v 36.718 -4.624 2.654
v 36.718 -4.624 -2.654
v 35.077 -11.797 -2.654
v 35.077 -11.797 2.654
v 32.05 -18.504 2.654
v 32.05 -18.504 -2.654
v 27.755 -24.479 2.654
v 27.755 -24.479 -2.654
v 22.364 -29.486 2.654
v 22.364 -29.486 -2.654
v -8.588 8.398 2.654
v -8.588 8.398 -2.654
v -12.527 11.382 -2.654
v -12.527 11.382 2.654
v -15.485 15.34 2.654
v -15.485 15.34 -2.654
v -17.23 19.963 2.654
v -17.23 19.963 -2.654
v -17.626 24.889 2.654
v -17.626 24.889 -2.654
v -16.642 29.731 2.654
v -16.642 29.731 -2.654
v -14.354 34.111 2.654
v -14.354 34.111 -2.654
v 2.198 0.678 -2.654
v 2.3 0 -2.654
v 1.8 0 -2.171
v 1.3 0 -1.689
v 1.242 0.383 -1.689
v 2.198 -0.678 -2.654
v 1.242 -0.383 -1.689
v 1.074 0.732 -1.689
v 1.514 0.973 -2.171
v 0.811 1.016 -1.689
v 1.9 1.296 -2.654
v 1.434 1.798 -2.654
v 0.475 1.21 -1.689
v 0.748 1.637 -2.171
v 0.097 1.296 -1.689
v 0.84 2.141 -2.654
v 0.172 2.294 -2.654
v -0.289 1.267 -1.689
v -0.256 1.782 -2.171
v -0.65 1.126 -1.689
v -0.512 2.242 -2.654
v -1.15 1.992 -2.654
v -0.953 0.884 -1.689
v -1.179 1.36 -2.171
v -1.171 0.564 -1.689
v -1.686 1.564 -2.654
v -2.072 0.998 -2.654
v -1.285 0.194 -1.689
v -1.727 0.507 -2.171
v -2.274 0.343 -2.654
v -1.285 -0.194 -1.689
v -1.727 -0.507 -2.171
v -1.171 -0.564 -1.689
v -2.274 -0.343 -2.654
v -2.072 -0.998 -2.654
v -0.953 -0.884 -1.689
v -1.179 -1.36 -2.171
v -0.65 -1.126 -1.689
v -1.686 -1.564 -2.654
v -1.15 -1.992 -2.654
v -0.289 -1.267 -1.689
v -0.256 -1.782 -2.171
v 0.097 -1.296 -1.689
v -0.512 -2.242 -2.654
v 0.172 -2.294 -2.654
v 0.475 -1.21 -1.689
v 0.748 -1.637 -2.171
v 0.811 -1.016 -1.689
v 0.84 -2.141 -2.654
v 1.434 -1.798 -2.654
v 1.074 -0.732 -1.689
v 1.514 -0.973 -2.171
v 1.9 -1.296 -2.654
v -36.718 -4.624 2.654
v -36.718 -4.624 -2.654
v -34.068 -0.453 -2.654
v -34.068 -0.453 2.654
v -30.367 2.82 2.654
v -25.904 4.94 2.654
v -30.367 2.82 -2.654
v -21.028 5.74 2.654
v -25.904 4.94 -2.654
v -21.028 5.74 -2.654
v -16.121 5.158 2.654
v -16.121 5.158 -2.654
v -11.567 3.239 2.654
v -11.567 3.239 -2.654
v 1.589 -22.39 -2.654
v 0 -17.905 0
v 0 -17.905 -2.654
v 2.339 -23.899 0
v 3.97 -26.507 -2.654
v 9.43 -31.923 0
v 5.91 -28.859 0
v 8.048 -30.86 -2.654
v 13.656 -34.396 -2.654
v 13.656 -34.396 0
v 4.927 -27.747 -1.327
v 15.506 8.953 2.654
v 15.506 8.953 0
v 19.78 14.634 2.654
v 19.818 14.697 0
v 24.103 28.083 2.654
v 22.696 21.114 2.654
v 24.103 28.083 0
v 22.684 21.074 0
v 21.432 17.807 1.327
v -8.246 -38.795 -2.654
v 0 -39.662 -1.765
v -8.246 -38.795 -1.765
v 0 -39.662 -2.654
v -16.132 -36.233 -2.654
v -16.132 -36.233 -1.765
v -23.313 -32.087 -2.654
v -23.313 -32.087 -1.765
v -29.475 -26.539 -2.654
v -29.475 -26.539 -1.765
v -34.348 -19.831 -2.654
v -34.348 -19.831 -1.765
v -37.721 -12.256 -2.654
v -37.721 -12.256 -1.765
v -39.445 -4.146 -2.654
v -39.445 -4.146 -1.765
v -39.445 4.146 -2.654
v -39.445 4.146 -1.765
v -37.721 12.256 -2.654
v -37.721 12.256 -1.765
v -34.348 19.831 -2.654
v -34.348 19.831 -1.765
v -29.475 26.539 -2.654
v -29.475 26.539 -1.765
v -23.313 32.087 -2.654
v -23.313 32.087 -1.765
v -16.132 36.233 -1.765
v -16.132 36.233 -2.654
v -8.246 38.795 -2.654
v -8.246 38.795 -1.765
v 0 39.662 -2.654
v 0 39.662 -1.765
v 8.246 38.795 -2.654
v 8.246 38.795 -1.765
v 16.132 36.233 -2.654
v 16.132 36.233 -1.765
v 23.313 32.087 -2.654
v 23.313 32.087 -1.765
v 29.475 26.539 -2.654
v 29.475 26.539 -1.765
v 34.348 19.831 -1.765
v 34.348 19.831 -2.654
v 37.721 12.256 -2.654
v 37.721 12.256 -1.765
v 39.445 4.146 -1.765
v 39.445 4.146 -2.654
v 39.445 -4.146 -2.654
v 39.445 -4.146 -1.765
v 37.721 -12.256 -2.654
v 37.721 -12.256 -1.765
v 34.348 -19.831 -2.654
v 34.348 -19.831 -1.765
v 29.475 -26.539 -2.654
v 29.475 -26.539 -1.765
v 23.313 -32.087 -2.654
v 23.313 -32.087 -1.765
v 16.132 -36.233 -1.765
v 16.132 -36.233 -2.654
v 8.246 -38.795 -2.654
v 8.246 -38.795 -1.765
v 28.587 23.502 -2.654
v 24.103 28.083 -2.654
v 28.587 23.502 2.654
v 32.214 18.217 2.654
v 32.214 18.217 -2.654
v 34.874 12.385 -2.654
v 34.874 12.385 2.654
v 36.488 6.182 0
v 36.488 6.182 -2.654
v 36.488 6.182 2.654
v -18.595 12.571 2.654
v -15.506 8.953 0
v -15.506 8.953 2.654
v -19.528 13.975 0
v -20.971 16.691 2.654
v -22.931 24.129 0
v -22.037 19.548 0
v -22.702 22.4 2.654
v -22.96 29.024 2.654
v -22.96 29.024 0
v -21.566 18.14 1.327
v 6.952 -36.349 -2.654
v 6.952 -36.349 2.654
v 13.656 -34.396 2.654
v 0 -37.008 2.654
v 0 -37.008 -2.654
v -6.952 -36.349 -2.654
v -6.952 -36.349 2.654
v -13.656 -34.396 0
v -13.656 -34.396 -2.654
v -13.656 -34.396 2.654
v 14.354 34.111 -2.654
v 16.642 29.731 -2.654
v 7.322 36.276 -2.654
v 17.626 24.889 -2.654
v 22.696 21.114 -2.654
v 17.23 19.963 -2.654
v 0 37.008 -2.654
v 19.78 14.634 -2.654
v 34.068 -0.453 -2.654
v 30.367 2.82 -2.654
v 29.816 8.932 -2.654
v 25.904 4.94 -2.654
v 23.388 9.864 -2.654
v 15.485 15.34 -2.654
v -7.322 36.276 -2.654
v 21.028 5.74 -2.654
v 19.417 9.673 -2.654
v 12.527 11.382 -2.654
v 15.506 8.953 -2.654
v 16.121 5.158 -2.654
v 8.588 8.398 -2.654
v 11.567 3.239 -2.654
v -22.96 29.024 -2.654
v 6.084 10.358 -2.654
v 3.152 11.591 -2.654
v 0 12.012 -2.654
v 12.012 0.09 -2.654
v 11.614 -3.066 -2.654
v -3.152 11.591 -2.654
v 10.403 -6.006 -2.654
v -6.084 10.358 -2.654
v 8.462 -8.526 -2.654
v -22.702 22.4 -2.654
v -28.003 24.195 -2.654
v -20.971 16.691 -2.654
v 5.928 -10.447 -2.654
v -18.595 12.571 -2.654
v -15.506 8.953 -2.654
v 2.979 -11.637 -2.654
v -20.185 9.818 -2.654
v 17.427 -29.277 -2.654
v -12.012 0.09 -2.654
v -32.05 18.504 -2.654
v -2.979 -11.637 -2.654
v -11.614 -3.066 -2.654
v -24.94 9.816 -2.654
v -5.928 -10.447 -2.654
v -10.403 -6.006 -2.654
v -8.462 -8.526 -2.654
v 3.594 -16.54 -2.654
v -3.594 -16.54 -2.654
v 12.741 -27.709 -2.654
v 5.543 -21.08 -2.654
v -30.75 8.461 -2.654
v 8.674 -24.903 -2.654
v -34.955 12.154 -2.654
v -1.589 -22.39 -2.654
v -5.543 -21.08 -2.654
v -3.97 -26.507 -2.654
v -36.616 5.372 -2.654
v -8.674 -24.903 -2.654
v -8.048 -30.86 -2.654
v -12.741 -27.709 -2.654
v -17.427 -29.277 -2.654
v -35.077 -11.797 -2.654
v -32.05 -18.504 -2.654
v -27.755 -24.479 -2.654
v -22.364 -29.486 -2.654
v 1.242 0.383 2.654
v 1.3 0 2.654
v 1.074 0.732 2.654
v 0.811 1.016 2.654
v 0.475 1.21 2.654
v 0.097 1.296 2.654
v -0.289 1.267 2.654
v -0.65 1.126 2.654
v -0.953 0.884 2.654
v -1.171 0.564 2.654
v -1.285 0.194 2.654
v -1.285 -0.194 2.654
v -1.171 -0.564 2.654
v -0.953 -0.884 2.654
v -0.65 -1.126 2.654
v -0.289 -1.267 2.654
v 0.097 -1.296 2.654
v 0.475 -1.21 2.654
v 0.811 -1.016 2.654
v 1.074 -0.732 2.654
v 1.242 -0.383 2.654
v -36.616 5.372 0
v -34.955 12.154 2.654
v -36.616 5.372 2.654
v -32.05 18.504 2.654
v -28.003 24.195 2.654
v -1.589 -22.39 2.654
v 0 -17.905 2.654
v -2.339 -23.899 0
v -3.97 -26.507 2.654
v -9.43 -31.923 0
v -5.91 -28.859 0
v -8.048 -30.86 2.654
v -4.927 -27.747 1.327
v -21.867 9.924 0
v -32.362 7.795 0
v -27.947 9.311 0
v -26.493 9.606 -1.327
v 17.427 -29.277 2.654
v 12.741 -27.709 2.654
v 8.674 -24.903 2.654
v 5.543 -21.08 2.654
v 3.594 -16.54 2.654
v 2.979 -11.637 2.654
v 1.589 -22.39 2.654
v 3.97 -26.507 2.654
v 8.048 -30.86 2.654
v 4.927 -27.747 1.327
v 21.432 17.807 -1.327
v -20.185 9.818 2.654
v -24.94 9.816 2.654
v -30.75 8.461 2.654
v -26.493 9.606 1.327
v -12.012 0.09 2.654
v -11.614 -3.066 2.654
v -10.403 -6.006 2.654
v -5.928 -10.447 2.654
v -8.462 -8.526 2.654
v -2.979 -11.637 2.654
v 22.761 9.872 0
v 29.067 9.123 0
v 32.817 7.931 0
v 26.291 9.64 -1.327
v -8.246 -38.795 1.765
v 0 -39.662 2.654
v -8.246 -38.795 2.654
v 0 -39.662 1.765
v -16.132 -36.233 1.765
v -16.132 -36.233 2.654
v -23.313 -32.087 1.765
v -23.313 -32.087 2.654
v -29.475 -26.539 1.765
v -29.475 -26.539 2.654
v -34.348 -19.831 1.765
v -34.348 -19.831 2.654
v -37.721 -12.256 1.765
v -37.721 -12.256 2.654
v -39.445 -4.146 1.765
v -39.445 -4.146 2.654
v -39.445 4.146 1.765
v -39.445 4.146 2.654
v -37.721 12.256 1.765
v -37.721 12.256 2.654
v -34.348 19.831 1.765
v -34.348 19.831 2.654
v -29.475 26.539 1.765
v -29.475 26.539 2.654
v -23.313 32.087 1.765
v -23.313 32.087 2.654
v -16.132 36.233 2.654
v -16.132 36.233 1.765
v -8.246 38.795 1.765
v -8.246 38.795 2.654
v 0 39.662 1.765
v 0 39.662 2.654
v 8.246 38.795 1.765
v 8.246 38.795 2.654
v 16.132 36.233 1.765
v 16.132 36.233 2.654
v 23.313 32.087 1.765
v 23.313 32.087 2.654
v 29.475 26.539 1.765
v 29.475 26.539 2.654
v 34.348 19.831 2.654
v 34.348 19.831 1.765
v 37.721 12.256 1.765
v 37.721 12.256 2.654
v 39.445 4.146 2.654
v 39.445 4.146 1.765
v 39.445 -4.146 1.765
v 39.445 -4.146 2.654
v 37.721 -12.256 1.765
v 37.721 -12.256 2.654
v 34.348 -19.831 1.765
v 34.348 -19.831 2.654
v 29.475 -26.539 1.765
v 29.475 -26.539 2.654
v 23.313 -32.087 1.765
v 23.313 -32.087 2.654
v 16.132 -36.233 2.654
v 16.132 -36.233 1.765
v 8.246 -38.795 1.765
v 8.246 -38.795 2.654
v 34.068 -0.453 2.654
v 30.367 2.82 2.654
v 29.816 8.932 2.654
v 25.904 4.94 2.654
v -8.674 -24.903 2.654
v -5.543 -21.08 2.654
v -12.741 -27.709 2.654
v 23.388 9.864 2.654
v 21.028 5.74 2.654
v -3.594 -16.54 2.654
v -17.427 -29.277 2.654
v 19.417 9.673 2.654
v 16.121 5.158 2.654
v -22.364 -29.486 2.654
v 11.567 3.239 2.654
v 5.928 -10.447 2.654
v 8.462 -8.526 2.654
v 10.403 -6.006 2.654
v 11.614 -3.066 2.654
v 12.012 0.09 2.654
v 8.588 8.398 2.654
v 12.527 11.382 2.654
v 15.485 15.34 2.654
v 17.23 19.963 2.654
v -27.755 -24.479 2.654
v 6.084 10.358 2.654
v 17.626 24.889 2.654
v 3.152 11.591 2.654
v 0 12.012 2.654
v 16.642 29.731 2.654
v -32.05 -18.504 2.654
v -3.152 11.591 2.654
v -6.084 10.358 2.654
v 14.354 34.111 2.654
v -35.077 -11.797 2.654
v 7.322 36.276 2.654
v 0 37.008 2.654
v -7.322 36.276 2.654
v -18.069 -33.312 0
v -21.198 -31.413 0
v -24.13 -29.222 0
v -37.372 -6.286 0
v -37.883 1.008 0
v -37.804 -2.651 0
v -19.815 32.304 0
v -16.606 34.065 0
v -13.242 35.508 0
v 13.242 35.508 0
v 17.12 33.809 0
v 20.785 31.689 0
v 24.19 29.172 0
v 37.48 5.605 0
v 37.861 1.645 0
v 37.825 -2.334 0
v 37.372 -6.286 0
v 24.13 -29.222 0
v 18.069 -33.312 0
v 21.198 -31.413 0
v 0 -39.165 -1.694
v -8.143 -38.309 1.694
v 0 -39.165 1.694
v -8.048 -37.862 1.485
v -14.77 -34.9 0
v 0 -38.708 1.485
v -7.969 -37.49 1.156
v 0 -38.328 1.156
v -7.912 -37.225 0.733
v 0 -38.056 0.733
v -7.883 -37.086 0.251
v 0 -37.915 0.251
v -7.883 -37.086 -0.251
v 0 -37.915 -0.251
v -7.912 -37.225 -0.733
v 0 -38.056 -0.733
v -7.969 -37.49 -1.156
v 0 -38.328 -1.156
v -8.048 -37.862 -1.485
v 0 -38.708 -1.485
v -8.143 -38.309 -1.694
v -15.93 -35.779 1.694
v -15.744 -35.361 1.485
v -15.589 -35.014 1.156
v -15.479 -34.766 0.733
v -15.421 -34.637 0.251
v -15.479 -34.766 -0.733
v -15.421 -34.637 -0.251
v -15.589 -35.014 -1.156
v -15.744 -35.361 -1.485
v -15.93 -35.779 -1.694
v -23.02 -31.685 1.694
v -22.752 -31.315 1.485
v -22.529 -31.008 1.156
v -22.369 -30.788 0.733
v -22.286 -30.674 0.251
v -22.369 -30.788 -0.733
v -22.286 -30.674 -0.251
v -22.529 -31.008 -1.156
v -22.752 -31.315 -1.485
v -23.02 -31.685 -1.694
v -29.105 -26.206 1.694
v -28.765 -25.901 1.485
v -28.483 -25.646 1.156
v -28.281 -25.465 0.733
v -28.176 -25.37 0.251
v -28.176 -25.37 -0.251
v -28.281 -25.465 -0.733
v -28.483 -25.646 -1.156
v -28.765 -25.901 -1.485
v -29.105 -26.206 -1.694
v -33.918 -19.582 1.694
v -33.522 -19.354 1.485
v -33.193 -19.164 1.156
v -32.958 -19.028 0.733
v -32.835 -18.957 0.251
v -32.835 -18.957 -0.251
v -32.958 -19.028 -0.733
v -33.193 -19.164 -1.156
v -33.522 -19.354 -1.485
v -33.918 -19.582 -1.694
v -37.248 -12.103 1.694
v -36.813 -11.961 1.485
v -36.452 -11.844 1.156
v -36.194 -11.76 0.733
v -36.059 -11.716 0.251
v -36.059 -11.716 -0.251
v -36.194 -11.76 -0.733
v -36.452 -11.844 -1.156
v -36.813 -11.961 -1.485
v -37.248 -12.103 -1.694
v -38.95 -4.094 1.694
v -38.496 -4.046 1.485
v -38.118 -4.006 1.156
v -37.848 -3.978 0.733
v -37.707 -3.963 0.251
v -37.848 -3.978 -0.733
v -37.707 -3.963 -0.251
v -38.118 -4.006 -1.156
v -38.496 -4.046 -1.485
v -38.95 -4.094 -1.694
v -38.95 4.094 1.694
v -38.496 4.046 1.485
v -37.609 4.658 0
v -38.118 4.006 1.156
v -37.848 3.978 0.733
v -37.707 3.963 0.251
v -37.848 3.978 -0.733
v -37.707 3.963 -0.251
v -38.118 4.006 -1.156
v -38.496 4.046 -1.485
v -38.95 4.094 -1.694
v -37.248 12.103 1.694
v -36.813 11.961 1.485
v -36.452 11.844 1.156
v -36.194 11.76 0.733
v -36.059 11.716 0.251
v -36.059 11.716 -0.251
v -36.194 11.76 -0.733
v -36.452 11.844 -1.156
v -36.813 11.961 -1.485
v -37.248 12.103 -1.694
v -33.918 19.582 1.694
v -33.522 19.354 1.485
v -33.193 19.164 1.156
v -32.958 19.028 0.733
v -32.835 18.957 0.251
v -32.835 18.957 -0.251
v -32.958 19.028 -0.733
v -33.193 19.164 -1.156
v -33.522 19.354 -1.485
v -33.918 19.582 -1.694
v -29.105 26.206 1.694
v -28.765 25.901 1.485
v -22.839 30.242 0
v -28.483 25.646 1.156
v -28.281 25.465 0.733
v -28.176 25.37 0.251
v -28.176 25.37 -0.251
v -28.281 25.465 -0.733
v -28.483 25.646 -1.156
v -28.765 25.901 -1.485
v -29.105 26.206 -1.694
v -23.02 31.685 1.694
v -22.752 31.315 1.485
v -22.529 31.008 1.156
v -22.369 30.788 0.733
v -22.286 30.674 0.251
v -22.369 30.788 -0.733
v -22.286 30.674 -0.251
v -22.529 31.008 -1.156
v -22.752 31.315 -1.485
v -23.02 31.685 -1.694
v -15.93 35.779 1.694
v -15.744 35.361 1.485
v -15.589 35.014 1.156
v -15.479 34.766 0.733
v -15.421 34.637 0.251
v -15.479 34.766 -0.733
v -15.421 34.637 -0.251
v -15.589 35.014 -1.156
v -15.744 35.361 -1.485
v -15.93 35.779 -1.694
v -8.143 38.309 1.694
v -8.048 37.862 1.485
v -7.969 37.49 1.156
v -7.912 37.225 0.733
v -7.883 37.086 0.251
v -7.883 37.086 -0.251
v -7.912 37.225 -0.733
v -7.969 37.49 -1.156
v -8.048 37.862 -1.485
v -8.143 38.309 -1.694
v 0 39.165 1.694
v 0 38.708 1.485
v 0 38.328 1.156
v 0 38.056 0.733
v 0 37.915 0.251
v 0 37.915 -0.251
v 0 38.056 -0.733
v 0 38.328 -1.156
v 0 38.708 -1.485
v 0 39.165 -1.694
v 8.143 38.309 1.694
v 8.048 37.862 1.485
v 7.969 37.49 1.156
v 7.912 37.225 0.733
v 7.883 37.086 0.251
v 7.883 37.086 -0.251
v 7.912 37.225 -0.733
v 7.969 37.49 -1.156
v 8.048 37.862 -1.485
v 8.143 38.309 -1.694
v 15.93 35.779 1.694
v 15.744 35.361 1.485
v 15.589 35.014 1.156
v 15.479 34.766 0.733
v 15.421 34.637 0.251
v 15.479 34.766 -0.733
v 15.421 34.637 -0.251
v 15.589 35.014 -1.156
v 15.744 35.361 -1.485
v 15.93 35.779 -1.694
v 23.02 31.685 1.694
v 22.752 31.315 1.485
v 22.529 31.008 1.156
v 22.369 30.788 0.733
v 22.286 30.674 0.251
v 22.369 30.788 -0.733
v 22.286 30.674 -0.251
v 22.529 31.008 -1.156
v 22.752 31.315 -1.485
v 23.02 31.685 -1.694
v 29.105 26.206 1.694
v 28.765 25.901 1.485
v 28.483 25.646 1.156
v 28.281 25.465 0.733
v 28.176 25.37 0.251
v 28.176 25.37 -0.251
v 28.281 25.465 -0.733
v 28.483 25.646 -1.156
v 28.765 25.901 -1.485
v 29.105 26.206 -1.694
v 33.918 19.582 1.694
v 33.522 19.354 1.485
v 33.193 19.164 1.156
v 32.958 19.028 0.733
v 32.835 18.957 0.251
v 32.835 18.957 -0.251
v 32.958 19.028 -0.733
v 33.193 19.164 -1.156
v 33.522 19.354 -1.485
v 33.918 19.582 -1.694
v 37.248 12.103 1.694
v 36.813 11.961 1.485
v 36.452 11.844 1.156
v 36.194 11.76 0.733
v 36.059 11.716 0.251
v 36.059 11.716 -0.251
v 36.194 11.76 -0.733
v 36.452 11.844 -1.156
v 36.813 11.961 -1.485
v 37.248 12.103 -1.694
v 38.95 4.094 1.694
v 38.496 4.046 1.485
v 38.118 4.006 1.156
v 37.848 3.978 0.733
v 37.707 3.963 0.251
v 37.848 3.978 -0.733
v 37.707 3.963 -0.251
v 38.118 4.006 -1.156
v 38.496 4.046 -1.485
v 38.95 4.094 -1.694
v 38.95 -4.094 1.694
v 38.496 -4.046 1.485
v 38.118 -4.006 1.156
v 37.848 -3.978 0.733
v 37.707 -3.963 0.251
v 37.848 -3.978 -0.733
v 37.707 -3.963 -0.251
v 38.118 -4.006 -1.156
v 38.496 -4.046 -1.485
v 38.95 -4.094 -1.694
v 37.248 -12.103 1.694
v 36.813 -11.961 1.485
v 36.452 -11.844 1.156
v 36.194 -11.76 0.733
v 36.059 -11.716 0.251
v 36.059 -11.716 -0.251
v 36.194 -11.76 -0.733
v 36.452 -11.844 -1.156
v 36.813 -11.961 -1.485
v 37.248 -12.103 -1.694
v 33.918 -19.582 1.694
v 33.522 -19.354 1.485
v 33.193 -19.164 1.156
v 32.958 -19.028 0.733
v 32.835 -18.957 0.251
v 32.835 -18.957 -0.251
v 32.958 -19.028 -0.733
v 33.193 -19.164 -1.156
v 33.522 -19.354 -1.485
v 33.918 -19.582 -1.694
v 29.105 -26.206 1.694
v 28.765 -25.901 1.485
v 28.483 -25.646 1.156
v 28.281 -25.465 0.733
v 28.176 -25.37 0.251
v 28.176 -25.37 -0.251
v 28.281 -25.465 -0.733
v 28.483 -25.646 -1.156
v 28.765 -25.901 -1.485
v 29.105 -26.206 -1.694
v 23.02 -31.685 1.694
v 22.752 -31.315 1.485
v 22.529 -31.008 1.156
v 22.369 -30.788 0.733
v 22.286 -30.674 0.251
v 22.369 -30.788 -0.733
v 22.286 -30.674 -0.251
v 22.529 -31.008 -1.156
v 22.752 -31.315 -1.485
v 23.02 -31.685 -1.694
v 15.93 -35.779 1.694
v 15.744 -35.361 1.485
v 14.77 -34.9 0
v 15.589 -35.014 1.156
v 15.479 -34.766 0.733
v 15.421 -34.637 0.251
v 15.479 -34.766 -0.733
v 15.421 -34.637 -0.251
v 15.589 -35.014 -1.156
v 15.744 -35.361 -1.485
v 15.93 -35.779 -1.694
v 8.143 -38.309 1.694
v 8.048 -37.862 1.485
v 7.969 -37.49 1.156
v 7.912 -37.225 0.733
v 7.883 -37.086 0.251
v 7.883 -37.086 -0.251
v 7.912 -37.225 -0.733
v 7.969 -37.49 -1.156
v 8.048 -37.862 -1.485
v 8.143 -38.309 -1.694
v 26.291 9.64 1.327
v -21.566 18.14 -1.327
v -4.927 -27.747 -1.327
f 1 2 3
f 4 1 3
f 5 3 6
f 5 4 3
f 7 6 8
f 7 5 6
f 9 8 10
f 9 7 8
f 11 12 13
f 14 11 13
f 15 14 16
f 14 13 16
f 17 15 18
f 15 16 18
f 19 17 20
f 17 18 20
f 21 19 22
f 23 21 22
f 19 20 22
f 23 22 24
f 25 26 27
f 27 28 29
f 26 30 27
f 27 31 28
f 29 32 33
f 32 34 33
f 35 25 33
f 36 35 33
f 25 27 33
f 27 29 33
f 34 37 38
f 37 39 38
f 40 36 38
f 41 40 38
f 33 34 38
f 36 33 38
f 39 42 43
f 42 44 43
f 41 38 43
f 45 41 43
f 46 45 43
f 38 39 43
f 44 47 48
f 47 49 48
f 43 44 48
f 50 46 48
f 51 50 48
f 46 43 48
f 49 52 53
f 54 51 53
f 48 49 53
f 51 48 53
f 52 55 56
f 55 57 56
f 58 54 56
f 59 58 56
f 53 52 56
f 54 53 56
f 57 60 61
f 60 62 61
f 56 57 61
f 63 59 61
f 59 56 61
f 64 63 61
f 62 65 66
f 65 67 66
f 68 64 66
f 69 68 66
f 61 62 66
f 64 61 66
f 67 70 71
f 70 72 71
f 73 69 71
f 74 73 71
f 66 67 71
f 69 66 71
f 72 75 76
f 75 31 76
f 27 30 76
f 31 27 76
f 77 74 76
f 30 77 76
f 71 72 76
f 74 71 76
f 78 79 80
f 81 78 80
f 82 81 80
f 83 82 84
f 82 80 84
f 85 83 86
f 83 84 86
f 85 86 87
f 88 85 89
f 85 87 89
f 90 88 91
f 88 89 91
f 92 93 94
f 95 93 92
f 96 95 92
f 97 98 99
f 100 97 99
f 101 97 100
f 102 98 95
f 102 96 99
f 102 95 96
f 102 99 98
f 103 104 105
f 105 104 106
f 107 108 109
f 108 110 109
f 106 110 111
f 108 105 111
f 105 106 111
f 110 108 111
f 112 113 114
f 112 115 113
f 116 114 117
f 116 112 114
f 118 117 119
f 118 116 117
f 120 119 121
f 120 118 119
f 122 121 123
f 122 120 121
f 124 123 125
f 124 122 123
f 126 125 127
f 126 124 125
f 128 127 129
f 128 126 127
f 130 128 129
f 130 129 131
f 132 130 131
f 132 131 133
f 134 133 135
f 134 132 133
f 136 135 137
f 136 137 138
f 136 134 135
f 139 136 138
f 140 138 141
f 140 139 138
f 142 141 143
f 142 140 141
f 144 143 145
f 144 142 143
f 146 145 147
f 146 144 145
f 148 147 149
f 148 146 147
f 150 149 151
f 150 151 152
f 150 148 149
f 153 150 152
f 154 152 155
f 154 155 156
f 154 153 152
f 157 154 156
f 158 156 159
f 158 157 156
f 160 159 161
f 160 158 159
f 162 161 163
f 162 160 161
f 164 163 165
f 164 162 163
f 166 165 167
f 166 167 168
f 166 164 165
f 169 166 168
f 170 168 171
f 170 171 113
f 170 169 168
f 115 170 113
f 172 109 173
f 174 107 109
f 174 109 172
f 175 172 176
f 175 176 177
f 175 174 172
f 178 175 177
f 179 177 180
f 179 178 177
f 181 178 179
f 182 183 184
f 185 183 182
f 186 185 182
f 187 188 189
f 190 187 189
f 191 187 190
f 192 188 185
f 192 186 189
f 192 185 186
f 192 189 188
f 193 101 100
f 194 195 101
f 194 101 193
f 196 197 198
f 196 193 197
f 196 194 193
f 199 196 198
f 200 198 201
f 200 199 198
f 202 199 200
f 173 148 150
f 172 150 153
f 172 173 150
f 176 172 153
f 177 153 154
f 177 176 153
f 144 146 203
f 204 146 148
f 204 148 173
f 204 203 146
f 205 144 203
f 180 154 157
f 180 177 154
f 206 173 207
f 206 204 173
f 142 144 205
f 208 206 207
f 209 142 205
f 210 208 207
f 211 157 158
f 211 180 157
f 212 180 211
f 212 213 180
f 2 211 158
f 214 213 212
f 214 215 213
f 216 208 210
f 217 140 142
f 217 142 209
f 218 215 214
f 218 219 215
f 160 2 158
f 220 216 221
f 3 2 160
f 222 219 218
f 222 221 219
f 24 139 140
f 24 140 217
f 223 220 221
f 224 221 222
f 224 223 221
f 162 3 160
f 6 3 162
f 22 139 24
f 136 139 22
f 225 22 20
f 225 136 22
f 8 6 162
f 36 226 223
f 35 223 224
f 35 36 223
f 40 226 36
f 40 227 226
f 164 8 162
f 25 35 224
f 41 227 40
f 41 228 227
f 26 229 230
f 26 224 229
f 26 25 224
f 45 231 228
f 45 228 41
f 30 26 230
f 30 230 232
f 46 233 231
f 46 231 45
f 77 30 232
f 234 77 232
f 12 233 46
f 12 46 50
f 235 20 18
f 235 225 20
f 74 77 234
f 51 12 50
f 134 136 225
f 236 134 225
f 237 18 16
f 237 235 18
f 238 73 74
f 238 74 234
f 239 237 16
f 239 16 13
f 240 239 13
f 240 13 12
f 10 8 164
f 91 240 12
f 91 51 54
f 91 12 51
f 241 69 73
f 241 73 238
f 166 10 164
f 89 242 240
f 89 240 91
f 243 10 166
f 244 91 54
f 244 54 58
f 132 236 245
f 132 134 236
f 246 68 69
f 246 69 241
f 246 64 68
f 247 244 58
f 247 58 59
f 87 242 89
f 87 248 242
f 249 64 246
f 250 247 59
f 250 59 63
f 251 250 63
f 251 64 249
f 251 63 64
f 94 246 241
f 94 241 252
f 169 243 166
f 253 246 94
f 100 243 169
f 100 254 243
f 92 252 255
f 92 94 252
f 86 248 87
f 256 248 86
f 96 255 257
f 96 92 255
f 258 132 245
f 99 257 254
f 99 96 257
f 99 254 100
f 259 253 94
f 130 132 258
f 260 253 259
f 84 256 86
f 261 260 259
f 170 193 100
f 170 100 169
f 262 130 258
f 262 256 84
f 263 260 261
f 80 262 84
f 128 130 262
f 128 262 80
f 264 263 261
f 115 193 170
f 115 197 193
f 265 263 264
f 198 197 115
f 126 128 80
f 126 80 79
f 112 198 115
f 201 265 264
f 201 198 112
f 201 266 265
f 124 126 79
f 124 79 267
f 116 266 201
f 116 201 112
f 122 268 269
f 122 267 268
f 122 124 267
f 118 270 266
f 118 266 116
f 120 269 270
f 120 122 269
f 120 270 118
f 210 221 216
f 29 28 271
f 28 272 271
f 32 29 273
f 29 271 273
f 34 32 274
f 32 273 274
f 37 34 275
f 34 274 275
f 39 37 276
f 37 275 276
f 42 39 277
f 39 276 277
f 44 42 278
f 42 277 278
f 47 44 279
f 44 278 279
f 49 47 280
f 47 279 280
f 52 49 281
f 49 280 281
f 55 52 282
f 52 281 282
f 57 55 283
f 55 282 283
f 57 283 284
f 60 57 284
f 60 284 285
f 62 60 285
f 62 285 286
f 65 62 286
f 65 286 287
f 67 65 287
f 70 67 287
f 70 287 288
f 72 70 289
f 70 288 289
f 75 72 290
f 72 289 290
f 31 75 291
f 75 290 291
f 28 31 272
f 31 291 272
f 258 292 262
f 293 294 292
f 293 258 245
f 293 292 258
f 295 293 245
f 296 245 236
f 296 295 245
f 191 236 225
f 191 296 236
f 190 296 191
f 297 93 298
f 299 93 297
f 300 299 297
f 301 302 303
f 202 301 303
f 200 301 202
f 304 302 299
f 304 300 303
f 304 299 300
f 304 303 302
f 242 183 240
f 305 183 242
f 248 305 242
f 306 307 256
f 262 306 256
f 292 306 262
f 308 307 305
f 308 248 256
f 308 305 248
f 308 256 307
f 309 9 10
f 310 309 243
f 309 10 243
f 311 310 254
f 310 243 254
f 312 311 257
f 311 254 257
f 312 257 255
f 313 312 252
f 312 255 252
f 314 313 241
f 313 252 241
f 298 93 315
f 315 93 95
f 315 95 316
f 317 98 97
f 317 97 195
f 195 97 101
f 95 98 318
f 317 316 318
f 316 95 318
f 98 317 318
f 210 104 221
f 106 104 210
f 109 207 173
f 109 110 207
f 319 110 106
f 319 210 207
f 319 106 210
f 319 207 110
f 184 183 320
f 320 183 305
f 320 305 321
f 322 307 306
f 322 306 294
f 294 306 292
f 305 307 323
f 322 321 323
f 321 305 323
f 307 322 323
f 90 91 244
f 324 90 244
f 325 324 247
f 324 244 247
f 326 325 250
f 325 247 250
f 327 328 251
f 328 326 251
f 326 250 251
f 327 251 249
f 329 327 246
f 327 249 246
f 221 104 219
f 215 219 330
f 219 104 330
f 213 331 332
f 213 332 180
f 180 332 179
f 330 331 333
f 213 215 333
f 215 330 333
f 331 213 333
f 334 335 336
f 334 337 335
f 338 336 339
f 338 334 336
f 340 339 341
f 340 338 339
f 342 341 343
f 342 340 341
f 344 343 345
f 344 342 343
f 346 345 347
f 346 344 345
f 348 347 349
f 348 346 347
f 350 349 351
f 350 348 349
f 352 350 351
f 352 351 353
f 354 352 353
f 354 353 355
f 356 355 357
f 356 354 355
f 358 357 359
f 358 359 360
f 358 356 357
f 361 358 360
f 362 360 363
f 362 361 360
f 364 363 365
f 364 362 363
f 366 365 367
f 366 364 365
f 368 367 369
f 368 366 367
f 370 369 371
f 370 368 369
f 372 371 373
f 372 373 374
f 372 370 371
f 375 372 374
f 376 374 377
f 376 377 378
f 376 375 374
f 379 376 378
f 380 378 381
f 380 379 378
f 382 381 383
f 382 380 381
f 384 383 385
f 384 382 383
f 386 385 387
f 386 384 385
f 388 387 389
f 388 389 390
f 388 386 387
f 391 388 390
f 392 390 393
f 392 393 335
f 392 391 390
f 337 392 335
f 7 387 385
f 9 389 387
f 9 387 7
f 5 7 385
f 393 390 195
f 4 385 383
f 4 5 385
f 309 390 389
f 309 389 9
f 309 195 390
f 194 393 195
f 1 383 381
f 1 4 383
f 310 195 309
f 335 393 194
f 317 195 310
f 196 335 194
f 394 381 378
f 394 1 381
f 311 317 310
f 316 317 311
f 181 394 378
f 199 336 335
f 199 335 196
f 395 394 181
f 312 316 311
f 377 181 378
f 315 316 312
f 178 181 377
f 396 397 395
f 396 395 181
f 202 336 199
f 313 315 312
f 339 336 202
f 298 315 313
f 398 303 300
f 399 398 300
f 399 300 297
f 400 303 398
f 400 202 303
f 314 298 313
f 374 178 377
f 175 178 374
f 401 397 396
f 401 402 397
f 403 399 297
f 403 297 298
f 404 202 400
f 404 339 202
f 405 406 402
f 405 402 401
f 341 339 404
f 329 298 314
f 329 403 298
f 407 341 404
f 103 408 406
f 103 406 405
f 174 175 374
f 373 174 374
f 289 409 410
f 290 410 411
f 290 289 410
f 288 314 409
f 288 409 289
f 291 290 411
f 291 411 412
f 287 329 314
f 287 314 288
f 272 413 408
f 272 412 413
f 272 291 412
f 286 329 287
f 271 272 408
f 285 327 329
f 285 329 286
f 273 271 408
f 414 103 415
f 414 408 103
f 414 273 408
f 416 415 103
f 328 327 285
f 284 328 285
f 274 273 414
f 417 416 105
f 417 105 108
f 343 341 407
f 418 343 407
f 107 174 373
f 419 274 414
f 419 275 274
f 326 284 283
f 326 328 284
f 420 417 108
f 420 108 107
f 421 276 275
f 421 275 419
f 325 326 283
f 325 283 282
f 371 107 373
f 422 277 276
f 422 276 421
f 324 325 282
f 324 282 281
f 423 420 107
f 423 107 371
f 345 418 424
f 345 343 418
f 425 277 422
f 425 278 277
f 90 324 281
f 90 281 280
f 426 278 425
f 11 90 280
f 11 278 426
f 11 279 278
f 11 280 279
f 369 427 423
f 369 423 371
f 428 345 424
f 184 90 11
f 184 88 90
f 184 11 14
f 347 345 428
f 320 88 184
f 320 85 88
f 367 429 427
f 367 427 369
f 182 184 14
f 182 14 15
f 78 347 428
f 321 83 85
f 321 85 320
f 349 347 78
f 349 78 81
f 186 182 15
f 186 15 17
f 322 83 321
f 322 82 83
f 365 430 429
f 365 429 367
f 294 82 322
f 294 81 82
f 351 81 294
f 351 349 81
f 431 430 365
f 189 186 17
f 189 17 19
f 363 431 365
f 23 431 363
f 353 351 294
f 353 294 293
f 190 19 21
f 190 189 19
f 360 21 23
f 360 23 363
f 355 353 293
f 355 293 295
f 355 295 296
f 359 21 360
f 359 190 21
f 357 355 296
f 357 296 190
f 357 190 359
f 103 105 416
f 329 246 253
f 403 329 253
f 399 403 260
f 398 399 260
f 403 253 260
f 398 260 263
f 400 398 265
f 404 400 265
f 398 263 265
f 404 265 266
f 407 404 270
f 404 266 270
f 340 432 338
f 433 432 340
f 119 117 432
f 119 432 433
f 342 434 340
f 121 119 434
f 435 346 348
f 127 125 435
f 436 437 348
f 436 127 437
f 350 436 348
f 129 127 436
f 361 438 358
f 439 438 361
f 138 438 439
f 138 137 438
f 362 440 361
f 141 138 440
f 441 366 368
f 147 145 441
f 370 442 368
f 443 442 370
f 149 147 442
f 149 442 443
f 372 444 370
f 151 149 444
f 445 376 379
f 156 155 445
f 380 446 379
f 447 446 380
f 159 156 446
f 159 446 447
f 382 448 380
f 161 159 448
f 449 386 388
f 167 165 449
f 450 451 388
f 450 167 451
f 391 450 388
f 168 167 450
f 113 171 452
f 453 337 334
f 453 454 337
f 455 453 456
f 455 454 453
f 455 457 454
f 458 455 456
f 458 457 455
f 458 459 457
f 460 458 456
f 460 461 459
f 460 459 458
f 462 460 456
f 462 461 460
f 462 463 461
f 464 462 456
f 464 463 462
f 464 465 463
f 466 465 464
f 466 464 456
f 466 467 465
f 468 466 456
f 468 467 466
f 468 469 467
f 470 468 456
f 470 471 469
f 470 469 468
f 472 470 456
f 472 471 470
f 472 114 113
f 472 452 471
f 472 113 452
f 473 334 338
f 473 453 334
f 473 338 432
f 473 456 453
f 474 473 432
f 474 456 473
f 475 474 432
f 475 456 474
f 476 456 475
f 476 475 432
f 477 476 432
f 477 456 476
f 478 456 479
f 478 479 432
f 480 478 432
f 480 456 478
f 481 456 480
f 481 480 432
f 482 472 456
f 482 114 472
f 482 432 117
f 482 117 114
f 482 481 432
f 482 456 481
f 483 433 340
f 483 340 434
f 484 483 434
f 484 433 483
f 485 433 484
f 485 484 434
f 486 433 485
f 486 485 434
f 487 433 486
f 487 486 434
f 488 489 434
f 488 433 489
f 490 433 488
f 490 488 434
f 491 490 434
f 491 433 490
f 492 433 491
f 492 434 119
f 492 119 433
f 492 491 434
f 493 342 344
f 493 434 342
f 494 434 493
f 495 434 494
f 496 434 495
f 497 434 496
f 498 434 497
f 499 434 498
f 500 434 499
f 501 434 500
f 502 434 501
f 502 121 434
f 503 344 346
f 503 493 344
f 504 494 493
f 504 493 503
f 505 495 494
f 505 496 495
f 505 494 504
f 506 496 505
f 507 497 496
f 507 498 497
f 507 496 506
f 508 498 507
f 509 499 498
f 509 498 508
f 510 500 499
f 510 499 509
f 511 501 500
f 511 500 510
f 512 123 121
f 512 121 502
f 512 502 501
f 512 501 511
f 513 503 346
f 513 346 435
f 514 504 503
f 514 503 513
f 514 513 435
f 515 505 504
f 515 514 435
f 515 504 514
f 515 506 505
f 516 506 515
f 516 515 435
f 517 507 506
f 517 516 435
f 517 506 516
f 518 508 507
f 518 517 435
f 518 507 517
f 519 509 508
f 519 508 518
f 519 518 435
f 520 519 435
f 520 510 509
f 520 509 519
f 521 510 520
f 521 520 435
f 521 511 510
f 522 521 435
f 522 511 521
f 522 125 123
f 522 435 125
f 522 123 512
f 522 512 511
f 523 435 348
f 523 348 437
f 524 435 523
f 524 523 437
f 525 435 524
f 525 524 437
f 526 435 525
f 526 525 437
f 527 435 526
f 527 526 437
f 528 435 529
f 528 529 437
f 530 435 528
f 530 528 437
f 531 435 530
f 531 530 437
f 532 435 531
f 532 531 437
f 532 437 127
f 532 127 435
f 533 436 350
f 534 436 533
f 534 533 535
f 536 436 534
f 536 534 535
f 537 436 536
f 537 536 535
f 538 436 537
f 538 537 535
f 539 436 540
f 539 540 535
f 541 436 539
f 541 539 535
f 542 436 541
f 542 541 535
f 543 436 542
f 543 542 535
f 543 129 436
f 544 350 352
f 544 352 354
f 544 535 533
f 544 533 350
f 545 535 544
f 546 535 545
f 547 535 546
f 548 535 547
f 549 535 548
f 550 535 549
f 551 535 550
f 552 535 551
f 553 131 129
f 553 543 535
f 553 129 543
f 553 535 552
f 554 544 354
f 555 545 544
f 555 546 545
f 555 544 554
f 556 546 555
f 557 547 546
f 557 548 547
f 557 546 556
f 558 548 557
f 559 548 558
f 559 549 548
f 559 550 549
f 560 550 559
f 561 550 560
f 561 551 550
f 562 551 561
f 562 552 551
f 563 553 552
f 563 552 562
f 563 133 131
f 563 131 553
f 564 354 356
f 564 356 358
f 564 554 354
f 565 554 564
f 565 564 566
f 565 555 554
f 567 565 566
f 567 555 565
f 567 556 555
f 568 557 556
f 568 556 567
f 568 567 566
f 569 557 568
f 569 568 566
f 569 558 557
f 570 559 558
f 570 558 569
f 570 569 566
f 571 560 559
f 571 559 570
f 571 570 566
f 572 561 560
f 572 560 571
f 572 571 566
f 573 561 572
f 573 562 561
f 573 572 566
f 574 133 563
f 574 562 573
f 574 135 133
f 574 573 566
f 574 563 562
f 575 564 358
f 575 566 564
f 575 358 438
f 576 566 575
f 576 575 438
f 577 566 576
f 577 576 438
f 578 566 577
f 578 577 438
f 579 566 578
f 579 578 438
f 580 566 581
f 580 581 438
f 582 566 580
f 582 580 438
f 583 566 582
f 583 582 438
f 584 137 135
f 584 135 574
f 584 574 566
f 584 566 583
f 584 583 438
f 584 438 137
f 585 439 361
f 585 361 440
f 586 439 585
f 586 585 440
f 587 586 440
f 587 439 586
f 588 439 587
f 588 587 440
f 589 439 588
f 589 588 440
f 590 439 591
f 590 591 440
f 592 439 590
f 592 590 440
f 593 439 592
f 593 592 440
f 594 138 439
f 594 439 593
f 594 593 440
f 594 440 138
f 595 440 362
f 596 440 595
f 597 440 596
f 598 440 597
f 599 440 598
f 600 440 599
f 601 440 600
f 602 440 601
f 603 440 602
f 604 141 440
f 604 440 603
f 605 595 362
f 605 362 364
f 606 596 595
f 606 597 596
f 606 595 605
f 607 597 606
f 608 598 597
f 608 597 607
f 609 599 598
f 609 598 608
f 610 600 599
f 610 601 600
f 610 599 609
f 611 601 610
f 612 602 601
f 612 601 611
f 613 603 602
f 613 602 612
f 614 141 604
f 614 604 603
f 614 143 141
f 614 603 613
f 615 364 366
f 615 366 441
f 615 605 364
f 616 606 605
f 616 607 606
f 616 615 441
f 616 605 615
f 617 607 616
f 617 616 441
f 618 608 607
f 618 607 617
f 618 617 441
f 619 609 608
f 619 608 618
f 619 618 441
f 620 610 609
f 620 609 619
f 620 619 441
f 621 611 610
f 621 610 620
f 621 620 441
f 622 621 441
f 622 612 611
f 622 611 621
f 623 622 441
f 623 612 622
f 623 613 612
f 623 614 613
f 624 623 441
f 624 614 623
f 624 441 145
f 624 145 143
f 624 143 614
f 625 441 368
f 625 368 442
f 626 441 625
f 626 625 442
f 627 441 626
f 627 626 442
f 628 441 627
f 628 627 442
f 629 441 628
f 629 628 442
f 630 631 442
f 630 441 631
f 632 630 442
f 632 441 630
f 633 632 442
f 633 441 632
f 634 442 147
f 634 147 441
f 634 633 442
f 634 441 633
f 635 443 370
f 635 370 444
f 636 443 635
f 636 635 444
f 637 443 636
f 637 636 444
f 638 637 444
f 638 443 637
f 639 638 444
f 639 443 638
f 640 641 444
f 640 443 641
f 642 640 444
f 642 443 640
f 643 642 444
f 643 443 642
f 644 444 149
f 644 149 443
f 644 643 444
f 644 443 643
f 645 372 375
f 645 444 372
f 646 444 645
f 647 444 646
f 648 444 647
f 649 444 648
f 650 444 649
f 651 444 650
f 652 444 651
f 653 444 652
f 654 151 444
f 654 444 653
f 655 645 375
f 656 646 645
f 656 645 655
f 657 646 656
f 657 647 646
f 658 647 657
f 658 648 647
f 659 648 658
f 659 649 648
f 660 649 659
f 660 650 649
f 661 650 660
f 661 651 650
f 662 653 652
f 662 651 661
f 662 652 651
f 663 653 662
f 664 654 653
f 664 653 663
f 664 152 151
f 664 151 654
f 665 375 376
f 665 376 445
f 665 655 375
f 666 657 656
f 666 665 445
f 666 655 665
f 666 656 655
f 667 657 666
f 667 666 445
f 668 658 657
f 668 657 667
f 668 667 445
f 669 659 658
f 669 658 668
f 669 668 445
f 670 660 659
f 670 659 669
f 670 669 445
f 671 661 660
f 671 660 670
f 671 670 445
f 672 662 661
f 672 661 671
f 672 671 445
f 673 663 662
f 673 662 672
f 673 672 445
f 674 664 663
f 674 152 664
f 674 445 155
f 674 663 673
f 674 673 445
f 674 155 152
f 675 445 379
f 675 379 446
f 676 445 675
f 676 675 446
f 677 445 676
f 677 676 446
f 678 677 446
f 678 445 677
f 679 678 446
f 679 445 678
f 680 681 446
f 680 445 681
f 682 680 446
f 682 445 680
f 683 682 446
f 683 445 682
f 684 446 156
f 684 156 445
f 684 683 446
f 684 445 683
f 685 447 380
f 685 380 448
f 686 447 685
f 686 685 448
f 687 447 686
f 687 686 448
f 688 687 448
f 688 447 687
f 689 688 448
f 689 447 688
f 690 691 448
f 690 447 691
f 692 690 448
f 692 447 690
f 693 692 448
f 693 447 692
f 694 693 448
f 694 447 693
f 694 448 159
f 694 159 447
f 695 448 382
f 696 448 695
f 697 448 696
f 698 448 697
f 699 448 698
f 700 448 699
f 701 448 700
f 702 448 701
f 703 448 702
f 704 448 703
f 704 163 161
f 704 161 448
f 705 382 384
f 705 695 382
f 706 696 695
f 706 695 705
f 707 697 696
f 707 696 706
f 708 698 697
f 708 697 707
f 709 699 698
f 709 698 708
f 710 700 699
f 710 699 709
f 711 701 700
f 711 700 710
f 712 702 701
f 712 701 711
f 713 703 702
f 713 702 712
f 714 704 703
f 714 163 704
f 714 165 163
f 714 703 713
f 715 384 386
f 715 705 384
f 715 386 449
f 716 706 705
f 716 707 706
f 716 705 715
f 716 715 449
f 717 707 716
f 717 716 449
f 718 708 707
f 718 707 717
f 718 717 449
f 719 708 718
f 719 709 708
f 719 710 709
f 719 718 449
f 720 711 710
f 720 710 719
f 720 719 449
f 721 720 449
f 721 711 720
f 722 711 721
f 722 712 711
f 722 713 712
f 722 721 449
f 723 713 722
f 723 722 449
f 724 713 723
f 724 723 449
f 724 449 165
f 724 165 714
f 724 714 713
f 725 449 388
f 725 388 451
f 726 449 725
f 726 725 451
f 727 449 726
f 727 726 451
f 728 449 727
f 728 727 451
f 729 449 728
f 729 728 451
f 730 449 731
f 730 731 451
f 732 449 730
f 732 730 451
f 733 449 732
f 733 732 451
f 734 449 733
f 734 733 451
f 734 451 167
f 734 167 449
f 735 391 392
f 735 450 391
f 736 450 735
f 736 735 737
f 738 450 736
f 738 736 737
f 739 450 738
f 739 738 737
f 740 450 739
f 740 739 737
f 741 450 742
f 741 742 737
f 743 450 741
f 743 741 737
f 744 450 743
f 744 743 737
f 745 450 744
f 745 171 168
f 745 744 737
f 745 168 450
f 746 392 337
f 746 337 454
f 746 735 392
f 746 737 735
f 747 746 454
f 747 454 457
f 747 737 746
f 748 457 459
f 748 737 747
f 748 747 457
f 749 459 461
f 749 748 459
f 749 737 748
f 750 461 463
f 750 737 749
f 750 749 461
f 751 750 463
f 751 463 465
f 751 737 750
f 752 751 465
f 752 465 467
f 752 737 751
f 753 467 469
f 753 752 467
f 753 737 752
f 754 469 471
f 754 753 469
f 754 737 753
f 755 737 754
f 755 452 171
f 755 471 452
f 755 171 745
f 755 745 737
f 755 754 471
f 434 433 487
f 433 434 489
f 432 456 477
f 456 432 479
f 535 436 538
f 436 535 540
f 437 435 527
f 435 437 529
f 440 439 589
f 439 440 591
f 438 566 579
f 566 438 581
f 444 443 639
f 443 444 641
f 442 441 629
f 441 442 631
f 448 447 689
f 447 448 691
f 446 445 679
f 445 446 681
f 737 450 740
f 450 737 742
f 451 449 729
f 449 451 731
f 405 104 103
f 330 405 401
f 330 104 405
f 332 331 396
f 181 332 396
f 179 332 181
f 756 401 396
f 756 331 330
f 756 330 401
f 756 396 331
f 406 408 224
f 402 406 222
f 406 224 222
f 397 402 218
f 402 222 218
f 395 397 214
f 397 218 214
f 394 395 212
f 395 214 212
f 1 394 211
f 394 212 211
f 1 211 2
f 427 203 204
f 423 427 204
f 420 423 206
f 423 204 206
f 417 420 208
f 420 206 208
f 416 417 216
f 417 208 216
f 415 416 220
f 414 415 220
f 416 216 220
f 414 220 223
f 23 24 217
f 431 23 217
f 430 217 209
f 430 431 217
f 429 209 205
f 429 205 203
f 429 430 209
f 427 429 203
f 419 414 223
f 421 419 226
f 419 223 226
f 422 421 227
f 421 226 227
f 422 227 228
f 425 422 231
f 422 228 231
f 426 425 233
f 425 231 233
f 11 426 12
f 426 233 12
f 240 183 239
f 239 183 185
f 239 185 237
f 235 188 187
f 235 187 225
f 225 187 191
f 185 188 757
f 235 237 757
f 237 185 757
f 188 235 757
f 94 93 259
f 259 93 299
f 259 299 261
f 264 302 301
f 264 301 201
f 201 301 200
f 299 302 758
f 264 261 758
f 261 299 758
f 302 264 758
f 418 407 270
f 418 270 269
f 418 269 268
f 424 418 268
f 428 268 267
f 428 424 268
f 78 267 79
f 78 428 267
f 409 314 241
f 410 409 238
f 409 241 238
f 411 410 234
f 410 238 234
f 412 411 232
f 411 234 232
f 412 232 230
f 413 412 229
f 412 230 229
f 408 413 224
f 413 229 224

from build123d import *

# Parameters (mm, degrees)
BOSS_EXTRUDE1_REACH                             = 4.654
BOSS_EXTRUDE1_DIRECTION_2_REACH                 = 4.654
CSK_FOR_M2_RAISED_CROSS_HEAD_SCREW1_D           = 2.6
CSK_FOR_M2_RAISED_CROSS_HEAD_SCREW1_CSINK_D     = 4.6
CSK_FOR_M2_RAISED_CROSS_HEAD_SCREW1_CSINK_ANGLE = 92


with BuildPart() as part:
    # Sketch4 → Revolve3 (revolve)
    with BuildSketch(Plane(origin=(0, 0, 0), x_dir=(0, 0, -1), z_dir=(1, 0, 0))):
        with BuildLine():
            Line((-2.6543, -39.6621), (-1.7653, -39.6621))
            ThreePointArc((-1.7653, -39.6621), (0, -37.8968), (1.7653, -39.6621))
            Line((1.7653, -39.6621), (2.6543, -39.6621))
            Line((2.6543, -39.6621), (2.6543, -37.0078))
            Line((2.6543, -37.0078), (-2.6543, -37.0078))
            Line((-2.6543, -37.0078), (-2.6543, -39.6621))
        make_face()
    revolve(axis=Axis((0, 0, 1.7653), (0, 0, -1)))

    # Boss-Extrude1: up to this face of the body (flat: up to its plane)
    boss_extrude1_end = Plane(part.part.faces().sort_by_distance((0, 38.540286405, -2.6543))[0])
    # Sketch5 → Boss-Extrude1 (add, up to the picked face)
    with BuildSketch(Plane.XY, mode=Mode.PRIVATE) as boss_extrude1_sk1:
        with BuildLine():
            ThreePointArc((2.978912783, -11.636990203), (10.402888866, -6.006110687), (11.56738553, 3.238680956))
            ThreePointArc((11.56738553, 3.238680956), (26.749196364, 4.65193852), (37.371776023, -6.286319044))
            ThreePointArc((37.371776023, -6.286319044), (37.895229039, -0.345059896), (37.48005165, 5.604746073))
            add(Edge.make_bspline(
                [(15.506400774, 8.952624661), (27.141070528, 11.852195949), (37.48005165, 5.604746073)],
                knots=[0, 0, 0, 1, 1, 1], degree=2))
            add(Edge.make_bspline(
                [(15.506400774, 8.952624661), (23.43091271, 17.496942665), (24.189816075, 29.172251345)],
                knots=[0, 0, 0, 1, 1, 1], degree=2))
            ThreePointArc((24.189816075, 29.172251345), (18.982008892, 32.800164461), (13.241776023, 35.508066943))
            ThreePointArc((13.241776023, 35.508066943), (17.403295117, 20.839514322), (8.588472748, 8.398309247))
            ThreePointArc((8.588472748, 8.398309247), (0, 12.012221374), (-8.588472748, 8.398309247))
            ThreePointArc((-8.588472748, 8.398309247), (-17.403295117, 20.839514322), (-13.241776023, 35.508066943))
            ThreePointArc((-13.241776023, 35.508066943), (-18.231527824, 33.22316727), (-22.83893963, 30.241532482))
            add(Edge.make_bspline(
                [(-15.506400774, 8.952624661), (-24.330033969, 17.722070983), (-22.83893963, 30.241532482)],
                knots=[0, 0, 0, 1, 1, 1], degree=2))
            add(Edge.make_bspline(
                [(-15.506400774, 8.952624661), (-27.512780663, 12.209392), (-37.609405193, 4.658335674)],
                knots=[0, 0, 0, 1, 1, 1], degree=2))
            ThreePointArc((-37.609405193, 4.658335674), (-37.887870762, -0.822617389), (-37.371776023, -6.286319044))
            ThreePointArc((-37.371776023, -6.286319044), (-26.749196364, 4.65193852), (-11.56738553, 3.238680956))
            ThreePointArc((-11.56738553, 3.238680956), (-10.402888866, -6.006110687), (-2.978912783, -11.636990203))
            ThreePointArc((-2.978912783, -11.636990203), (-9.345901247, -25.491452842), (-24.13, -29.221747898))
            ThreePointArc((-24.13, -29.221747898), (-19.656342938, -32.400549881), (-14.770465564, -34.899868156))
            add(Edge.make_bspline(
                [(0, -17.905249322), (-3.182746695, -29.931462983), (-14.770465564, -34.899868156)],
                knots=[0, 0, 0, 1, 1, 1], degree=2))
            add(Edge.make_bspline(
                [(0, -17.905249322), (3.182746695, -29.931462983), (14.770465564, -34.899868156)],
                knots=[0, 0, 0, 1, 1, 1], degree=2))
            ThreePointArc((14.770465564, -34.899868156), (19.656342938, -32.400549881), (24.13, -29.221747898))
            ThreePointArc((24.13, -29.221747898), (9.345901247, -25.491452842), (2.978912783, -11.636990203))
        make_face()
    boss_extrude1_tool1 = split(extrude(boss_extrude1_sk1.sketch, amount=-BOSS_EXTRUDE1_REACH, mode=Mode.PRIVATE), bisect_by=boss_extrude1_end, keep=Keep.BOTH, mode=Mode.PRIVATE)
    add(boss_extrude1_tool1.solids().sort_by_distance((0.196494, 0.141193, 0))[0])

    # Boss-Extrude1 direction 2: up to this face of the body (flat: up to its plane)
    boss_extrude1_direction_2_end = Plane(part.part.faces().sort_by_distance((0, 38.129613595, 2.6543))[0])
    # Sketch5 → Boss-Extrude1 direction 2 (add, up to the picked face)
    with BuildSketch(Plane.XY, mode=Mode.PRIVATE) as boss_extrude1_direction_2_sk1:
        with BuildLine():
            ThreePointArc((2.978912783, -11.636990203), (10.402888866, -6.006110687), (11.56738553, 3.238680956))
            ThreePointArc((11.56738553, 3.238680956), (26.749196364, 4.65193852), (37.371776023, -6.286319044))
            ThreePointArc((37.371776023, -6.286319044), (37.895229039, -0.345059896), (37.48005165, 5.604746073))
            add(Edge.make_bspline(
                [(15.506400774, 8.952624661), (27.141070528, 11.852195949), (37.48005165, 5.604746073)],
                knots=[0, 0, 0, 1, 1, 1], degree=2))
            add(Edge.make_bspline(
                [(15.506400774, 8.952624661), (23.43091271, 17.496942665), (24.189816075, 29.172251345)],
                knots=[0, 0, 0, 1, 1, 1], degree=2))
            ThreePointArc((24.189816075, 29.172251345), (18.982008892, 32.800164461), (13.241776023, 35.508066943))
            ThreePointArc((13.241776023, 35.508066943), (17.403295117, 20.839514322), (8.588472748, 8.398309247))
            ThreePointArc((8.588472748, 8.398309247), (0, 12.012221374), (-8.588472748, 8.398309247))
            ThreePointArc((-8.588472748, 8.398309247), (-17.403295117, 20.839514322), (-13.241776023, 35.508066943))
            ThreePointArc((-13.241776023, 35.508066943), (-18.231527824, 33.22316727), (-22.83893963, 30.241532482))
            add(Edge.make_bspline(
                [(-15.506400774, 8.952624661), (-24.330033969, 17.722070983), (-22.83893963, 30.241532482)],
                knots=[0, 0, 0, 1, 1, 1], degree=2))
            add(Edge.make_bspline(
                [(-15.506400774, 8.952624661), (-27.512780663, 12.209392), (-37.609405193, 4.658335674)],
                knots=[0, 0, 0, 1, 1, 1], degree=2))
            ThreePointArc((-37.609405193, 4.658335674), (-37.887870762, -0.822617389), (-37.371776023, -6.286319044))
            ThreePointArc((-37.371776023, -6.286319044), (-26.749196364, 4.65193852), (-11.56738553, 3.238680956))
            ThreePointArc((-11.56738553, 3.238680956), (-10.402888866, -6.006110687), (-2.978912783, -11.636990203))
            ThreePointArc((-2.978912783, -11.636990203), (-9.345901247, -25.491452842), (-24.13, -29.221747898))
            ThreePointArc((-24.13, -29.221747898), (-19.656342938, -32.400549881), (-14.770465564, -34.899868156))
            add(Edge.make_bspline(
                [(0, -17.905249322), (-3.182746695, -29.931462983), (-14.770465564, -34.899868156)],
                knots=[0, 0, 0, 1, 1, 1], degree=2))
            add(Edge.make_bspline(
                [(0, -17.905249322), (3.182746695, -29.931462983), (14.770465564, -34.899868156)],
                knots=[0, 0, 0, 1, 1, 1], degree=2))
            ThreePointArc((14.770465564, -34.899868156), (19.656342938, -32.400549881), (24.13, -29.221747898))
            ThreePointArc((24.13, -29.221747898), (9.345901247, -25.491452842), (2.978912783, -11.636990203))
        make_face()
    boss_extrude1_direction_2_tool1 = split(extrude(boss_extrude1_direction_2_sk1.sketch, amount=BOSS_EXTRUDE1_DIRECTION_2_REACH, mode=Mode.PRIVATE), bisect_by=boss_extrude1_direction_2_end, keep=Keep.BOTH, mode=Mode.PRIVATE)
    add(boss_extrude1_direction_2_tool1.solids().sort_by_distance((0.196494, 0.141193, 0))[0])

    # CSK for M2 Raised Cross Head Screw1 (through all)
    with Locations(Plane(origin=(0, 0, -2.6543), x_dir=(-1, 0, 0), z_dir=(0, 0, -1))):
        with Locations((0, 0)):
            CounterSinkHole(CSK_FOR_M2_RAISED_CROSS_HEAD_SCREW1_D / 2, CSK_FOR_M2_RAISED_CROSS_HEAD_SCREW1_CSINK_D / 2, counter_sink_angle=CSK_FOR_M2_RAISED_CROSS_HEAD_SCREW1_CSINK_ANGLE)


solid = part.part
